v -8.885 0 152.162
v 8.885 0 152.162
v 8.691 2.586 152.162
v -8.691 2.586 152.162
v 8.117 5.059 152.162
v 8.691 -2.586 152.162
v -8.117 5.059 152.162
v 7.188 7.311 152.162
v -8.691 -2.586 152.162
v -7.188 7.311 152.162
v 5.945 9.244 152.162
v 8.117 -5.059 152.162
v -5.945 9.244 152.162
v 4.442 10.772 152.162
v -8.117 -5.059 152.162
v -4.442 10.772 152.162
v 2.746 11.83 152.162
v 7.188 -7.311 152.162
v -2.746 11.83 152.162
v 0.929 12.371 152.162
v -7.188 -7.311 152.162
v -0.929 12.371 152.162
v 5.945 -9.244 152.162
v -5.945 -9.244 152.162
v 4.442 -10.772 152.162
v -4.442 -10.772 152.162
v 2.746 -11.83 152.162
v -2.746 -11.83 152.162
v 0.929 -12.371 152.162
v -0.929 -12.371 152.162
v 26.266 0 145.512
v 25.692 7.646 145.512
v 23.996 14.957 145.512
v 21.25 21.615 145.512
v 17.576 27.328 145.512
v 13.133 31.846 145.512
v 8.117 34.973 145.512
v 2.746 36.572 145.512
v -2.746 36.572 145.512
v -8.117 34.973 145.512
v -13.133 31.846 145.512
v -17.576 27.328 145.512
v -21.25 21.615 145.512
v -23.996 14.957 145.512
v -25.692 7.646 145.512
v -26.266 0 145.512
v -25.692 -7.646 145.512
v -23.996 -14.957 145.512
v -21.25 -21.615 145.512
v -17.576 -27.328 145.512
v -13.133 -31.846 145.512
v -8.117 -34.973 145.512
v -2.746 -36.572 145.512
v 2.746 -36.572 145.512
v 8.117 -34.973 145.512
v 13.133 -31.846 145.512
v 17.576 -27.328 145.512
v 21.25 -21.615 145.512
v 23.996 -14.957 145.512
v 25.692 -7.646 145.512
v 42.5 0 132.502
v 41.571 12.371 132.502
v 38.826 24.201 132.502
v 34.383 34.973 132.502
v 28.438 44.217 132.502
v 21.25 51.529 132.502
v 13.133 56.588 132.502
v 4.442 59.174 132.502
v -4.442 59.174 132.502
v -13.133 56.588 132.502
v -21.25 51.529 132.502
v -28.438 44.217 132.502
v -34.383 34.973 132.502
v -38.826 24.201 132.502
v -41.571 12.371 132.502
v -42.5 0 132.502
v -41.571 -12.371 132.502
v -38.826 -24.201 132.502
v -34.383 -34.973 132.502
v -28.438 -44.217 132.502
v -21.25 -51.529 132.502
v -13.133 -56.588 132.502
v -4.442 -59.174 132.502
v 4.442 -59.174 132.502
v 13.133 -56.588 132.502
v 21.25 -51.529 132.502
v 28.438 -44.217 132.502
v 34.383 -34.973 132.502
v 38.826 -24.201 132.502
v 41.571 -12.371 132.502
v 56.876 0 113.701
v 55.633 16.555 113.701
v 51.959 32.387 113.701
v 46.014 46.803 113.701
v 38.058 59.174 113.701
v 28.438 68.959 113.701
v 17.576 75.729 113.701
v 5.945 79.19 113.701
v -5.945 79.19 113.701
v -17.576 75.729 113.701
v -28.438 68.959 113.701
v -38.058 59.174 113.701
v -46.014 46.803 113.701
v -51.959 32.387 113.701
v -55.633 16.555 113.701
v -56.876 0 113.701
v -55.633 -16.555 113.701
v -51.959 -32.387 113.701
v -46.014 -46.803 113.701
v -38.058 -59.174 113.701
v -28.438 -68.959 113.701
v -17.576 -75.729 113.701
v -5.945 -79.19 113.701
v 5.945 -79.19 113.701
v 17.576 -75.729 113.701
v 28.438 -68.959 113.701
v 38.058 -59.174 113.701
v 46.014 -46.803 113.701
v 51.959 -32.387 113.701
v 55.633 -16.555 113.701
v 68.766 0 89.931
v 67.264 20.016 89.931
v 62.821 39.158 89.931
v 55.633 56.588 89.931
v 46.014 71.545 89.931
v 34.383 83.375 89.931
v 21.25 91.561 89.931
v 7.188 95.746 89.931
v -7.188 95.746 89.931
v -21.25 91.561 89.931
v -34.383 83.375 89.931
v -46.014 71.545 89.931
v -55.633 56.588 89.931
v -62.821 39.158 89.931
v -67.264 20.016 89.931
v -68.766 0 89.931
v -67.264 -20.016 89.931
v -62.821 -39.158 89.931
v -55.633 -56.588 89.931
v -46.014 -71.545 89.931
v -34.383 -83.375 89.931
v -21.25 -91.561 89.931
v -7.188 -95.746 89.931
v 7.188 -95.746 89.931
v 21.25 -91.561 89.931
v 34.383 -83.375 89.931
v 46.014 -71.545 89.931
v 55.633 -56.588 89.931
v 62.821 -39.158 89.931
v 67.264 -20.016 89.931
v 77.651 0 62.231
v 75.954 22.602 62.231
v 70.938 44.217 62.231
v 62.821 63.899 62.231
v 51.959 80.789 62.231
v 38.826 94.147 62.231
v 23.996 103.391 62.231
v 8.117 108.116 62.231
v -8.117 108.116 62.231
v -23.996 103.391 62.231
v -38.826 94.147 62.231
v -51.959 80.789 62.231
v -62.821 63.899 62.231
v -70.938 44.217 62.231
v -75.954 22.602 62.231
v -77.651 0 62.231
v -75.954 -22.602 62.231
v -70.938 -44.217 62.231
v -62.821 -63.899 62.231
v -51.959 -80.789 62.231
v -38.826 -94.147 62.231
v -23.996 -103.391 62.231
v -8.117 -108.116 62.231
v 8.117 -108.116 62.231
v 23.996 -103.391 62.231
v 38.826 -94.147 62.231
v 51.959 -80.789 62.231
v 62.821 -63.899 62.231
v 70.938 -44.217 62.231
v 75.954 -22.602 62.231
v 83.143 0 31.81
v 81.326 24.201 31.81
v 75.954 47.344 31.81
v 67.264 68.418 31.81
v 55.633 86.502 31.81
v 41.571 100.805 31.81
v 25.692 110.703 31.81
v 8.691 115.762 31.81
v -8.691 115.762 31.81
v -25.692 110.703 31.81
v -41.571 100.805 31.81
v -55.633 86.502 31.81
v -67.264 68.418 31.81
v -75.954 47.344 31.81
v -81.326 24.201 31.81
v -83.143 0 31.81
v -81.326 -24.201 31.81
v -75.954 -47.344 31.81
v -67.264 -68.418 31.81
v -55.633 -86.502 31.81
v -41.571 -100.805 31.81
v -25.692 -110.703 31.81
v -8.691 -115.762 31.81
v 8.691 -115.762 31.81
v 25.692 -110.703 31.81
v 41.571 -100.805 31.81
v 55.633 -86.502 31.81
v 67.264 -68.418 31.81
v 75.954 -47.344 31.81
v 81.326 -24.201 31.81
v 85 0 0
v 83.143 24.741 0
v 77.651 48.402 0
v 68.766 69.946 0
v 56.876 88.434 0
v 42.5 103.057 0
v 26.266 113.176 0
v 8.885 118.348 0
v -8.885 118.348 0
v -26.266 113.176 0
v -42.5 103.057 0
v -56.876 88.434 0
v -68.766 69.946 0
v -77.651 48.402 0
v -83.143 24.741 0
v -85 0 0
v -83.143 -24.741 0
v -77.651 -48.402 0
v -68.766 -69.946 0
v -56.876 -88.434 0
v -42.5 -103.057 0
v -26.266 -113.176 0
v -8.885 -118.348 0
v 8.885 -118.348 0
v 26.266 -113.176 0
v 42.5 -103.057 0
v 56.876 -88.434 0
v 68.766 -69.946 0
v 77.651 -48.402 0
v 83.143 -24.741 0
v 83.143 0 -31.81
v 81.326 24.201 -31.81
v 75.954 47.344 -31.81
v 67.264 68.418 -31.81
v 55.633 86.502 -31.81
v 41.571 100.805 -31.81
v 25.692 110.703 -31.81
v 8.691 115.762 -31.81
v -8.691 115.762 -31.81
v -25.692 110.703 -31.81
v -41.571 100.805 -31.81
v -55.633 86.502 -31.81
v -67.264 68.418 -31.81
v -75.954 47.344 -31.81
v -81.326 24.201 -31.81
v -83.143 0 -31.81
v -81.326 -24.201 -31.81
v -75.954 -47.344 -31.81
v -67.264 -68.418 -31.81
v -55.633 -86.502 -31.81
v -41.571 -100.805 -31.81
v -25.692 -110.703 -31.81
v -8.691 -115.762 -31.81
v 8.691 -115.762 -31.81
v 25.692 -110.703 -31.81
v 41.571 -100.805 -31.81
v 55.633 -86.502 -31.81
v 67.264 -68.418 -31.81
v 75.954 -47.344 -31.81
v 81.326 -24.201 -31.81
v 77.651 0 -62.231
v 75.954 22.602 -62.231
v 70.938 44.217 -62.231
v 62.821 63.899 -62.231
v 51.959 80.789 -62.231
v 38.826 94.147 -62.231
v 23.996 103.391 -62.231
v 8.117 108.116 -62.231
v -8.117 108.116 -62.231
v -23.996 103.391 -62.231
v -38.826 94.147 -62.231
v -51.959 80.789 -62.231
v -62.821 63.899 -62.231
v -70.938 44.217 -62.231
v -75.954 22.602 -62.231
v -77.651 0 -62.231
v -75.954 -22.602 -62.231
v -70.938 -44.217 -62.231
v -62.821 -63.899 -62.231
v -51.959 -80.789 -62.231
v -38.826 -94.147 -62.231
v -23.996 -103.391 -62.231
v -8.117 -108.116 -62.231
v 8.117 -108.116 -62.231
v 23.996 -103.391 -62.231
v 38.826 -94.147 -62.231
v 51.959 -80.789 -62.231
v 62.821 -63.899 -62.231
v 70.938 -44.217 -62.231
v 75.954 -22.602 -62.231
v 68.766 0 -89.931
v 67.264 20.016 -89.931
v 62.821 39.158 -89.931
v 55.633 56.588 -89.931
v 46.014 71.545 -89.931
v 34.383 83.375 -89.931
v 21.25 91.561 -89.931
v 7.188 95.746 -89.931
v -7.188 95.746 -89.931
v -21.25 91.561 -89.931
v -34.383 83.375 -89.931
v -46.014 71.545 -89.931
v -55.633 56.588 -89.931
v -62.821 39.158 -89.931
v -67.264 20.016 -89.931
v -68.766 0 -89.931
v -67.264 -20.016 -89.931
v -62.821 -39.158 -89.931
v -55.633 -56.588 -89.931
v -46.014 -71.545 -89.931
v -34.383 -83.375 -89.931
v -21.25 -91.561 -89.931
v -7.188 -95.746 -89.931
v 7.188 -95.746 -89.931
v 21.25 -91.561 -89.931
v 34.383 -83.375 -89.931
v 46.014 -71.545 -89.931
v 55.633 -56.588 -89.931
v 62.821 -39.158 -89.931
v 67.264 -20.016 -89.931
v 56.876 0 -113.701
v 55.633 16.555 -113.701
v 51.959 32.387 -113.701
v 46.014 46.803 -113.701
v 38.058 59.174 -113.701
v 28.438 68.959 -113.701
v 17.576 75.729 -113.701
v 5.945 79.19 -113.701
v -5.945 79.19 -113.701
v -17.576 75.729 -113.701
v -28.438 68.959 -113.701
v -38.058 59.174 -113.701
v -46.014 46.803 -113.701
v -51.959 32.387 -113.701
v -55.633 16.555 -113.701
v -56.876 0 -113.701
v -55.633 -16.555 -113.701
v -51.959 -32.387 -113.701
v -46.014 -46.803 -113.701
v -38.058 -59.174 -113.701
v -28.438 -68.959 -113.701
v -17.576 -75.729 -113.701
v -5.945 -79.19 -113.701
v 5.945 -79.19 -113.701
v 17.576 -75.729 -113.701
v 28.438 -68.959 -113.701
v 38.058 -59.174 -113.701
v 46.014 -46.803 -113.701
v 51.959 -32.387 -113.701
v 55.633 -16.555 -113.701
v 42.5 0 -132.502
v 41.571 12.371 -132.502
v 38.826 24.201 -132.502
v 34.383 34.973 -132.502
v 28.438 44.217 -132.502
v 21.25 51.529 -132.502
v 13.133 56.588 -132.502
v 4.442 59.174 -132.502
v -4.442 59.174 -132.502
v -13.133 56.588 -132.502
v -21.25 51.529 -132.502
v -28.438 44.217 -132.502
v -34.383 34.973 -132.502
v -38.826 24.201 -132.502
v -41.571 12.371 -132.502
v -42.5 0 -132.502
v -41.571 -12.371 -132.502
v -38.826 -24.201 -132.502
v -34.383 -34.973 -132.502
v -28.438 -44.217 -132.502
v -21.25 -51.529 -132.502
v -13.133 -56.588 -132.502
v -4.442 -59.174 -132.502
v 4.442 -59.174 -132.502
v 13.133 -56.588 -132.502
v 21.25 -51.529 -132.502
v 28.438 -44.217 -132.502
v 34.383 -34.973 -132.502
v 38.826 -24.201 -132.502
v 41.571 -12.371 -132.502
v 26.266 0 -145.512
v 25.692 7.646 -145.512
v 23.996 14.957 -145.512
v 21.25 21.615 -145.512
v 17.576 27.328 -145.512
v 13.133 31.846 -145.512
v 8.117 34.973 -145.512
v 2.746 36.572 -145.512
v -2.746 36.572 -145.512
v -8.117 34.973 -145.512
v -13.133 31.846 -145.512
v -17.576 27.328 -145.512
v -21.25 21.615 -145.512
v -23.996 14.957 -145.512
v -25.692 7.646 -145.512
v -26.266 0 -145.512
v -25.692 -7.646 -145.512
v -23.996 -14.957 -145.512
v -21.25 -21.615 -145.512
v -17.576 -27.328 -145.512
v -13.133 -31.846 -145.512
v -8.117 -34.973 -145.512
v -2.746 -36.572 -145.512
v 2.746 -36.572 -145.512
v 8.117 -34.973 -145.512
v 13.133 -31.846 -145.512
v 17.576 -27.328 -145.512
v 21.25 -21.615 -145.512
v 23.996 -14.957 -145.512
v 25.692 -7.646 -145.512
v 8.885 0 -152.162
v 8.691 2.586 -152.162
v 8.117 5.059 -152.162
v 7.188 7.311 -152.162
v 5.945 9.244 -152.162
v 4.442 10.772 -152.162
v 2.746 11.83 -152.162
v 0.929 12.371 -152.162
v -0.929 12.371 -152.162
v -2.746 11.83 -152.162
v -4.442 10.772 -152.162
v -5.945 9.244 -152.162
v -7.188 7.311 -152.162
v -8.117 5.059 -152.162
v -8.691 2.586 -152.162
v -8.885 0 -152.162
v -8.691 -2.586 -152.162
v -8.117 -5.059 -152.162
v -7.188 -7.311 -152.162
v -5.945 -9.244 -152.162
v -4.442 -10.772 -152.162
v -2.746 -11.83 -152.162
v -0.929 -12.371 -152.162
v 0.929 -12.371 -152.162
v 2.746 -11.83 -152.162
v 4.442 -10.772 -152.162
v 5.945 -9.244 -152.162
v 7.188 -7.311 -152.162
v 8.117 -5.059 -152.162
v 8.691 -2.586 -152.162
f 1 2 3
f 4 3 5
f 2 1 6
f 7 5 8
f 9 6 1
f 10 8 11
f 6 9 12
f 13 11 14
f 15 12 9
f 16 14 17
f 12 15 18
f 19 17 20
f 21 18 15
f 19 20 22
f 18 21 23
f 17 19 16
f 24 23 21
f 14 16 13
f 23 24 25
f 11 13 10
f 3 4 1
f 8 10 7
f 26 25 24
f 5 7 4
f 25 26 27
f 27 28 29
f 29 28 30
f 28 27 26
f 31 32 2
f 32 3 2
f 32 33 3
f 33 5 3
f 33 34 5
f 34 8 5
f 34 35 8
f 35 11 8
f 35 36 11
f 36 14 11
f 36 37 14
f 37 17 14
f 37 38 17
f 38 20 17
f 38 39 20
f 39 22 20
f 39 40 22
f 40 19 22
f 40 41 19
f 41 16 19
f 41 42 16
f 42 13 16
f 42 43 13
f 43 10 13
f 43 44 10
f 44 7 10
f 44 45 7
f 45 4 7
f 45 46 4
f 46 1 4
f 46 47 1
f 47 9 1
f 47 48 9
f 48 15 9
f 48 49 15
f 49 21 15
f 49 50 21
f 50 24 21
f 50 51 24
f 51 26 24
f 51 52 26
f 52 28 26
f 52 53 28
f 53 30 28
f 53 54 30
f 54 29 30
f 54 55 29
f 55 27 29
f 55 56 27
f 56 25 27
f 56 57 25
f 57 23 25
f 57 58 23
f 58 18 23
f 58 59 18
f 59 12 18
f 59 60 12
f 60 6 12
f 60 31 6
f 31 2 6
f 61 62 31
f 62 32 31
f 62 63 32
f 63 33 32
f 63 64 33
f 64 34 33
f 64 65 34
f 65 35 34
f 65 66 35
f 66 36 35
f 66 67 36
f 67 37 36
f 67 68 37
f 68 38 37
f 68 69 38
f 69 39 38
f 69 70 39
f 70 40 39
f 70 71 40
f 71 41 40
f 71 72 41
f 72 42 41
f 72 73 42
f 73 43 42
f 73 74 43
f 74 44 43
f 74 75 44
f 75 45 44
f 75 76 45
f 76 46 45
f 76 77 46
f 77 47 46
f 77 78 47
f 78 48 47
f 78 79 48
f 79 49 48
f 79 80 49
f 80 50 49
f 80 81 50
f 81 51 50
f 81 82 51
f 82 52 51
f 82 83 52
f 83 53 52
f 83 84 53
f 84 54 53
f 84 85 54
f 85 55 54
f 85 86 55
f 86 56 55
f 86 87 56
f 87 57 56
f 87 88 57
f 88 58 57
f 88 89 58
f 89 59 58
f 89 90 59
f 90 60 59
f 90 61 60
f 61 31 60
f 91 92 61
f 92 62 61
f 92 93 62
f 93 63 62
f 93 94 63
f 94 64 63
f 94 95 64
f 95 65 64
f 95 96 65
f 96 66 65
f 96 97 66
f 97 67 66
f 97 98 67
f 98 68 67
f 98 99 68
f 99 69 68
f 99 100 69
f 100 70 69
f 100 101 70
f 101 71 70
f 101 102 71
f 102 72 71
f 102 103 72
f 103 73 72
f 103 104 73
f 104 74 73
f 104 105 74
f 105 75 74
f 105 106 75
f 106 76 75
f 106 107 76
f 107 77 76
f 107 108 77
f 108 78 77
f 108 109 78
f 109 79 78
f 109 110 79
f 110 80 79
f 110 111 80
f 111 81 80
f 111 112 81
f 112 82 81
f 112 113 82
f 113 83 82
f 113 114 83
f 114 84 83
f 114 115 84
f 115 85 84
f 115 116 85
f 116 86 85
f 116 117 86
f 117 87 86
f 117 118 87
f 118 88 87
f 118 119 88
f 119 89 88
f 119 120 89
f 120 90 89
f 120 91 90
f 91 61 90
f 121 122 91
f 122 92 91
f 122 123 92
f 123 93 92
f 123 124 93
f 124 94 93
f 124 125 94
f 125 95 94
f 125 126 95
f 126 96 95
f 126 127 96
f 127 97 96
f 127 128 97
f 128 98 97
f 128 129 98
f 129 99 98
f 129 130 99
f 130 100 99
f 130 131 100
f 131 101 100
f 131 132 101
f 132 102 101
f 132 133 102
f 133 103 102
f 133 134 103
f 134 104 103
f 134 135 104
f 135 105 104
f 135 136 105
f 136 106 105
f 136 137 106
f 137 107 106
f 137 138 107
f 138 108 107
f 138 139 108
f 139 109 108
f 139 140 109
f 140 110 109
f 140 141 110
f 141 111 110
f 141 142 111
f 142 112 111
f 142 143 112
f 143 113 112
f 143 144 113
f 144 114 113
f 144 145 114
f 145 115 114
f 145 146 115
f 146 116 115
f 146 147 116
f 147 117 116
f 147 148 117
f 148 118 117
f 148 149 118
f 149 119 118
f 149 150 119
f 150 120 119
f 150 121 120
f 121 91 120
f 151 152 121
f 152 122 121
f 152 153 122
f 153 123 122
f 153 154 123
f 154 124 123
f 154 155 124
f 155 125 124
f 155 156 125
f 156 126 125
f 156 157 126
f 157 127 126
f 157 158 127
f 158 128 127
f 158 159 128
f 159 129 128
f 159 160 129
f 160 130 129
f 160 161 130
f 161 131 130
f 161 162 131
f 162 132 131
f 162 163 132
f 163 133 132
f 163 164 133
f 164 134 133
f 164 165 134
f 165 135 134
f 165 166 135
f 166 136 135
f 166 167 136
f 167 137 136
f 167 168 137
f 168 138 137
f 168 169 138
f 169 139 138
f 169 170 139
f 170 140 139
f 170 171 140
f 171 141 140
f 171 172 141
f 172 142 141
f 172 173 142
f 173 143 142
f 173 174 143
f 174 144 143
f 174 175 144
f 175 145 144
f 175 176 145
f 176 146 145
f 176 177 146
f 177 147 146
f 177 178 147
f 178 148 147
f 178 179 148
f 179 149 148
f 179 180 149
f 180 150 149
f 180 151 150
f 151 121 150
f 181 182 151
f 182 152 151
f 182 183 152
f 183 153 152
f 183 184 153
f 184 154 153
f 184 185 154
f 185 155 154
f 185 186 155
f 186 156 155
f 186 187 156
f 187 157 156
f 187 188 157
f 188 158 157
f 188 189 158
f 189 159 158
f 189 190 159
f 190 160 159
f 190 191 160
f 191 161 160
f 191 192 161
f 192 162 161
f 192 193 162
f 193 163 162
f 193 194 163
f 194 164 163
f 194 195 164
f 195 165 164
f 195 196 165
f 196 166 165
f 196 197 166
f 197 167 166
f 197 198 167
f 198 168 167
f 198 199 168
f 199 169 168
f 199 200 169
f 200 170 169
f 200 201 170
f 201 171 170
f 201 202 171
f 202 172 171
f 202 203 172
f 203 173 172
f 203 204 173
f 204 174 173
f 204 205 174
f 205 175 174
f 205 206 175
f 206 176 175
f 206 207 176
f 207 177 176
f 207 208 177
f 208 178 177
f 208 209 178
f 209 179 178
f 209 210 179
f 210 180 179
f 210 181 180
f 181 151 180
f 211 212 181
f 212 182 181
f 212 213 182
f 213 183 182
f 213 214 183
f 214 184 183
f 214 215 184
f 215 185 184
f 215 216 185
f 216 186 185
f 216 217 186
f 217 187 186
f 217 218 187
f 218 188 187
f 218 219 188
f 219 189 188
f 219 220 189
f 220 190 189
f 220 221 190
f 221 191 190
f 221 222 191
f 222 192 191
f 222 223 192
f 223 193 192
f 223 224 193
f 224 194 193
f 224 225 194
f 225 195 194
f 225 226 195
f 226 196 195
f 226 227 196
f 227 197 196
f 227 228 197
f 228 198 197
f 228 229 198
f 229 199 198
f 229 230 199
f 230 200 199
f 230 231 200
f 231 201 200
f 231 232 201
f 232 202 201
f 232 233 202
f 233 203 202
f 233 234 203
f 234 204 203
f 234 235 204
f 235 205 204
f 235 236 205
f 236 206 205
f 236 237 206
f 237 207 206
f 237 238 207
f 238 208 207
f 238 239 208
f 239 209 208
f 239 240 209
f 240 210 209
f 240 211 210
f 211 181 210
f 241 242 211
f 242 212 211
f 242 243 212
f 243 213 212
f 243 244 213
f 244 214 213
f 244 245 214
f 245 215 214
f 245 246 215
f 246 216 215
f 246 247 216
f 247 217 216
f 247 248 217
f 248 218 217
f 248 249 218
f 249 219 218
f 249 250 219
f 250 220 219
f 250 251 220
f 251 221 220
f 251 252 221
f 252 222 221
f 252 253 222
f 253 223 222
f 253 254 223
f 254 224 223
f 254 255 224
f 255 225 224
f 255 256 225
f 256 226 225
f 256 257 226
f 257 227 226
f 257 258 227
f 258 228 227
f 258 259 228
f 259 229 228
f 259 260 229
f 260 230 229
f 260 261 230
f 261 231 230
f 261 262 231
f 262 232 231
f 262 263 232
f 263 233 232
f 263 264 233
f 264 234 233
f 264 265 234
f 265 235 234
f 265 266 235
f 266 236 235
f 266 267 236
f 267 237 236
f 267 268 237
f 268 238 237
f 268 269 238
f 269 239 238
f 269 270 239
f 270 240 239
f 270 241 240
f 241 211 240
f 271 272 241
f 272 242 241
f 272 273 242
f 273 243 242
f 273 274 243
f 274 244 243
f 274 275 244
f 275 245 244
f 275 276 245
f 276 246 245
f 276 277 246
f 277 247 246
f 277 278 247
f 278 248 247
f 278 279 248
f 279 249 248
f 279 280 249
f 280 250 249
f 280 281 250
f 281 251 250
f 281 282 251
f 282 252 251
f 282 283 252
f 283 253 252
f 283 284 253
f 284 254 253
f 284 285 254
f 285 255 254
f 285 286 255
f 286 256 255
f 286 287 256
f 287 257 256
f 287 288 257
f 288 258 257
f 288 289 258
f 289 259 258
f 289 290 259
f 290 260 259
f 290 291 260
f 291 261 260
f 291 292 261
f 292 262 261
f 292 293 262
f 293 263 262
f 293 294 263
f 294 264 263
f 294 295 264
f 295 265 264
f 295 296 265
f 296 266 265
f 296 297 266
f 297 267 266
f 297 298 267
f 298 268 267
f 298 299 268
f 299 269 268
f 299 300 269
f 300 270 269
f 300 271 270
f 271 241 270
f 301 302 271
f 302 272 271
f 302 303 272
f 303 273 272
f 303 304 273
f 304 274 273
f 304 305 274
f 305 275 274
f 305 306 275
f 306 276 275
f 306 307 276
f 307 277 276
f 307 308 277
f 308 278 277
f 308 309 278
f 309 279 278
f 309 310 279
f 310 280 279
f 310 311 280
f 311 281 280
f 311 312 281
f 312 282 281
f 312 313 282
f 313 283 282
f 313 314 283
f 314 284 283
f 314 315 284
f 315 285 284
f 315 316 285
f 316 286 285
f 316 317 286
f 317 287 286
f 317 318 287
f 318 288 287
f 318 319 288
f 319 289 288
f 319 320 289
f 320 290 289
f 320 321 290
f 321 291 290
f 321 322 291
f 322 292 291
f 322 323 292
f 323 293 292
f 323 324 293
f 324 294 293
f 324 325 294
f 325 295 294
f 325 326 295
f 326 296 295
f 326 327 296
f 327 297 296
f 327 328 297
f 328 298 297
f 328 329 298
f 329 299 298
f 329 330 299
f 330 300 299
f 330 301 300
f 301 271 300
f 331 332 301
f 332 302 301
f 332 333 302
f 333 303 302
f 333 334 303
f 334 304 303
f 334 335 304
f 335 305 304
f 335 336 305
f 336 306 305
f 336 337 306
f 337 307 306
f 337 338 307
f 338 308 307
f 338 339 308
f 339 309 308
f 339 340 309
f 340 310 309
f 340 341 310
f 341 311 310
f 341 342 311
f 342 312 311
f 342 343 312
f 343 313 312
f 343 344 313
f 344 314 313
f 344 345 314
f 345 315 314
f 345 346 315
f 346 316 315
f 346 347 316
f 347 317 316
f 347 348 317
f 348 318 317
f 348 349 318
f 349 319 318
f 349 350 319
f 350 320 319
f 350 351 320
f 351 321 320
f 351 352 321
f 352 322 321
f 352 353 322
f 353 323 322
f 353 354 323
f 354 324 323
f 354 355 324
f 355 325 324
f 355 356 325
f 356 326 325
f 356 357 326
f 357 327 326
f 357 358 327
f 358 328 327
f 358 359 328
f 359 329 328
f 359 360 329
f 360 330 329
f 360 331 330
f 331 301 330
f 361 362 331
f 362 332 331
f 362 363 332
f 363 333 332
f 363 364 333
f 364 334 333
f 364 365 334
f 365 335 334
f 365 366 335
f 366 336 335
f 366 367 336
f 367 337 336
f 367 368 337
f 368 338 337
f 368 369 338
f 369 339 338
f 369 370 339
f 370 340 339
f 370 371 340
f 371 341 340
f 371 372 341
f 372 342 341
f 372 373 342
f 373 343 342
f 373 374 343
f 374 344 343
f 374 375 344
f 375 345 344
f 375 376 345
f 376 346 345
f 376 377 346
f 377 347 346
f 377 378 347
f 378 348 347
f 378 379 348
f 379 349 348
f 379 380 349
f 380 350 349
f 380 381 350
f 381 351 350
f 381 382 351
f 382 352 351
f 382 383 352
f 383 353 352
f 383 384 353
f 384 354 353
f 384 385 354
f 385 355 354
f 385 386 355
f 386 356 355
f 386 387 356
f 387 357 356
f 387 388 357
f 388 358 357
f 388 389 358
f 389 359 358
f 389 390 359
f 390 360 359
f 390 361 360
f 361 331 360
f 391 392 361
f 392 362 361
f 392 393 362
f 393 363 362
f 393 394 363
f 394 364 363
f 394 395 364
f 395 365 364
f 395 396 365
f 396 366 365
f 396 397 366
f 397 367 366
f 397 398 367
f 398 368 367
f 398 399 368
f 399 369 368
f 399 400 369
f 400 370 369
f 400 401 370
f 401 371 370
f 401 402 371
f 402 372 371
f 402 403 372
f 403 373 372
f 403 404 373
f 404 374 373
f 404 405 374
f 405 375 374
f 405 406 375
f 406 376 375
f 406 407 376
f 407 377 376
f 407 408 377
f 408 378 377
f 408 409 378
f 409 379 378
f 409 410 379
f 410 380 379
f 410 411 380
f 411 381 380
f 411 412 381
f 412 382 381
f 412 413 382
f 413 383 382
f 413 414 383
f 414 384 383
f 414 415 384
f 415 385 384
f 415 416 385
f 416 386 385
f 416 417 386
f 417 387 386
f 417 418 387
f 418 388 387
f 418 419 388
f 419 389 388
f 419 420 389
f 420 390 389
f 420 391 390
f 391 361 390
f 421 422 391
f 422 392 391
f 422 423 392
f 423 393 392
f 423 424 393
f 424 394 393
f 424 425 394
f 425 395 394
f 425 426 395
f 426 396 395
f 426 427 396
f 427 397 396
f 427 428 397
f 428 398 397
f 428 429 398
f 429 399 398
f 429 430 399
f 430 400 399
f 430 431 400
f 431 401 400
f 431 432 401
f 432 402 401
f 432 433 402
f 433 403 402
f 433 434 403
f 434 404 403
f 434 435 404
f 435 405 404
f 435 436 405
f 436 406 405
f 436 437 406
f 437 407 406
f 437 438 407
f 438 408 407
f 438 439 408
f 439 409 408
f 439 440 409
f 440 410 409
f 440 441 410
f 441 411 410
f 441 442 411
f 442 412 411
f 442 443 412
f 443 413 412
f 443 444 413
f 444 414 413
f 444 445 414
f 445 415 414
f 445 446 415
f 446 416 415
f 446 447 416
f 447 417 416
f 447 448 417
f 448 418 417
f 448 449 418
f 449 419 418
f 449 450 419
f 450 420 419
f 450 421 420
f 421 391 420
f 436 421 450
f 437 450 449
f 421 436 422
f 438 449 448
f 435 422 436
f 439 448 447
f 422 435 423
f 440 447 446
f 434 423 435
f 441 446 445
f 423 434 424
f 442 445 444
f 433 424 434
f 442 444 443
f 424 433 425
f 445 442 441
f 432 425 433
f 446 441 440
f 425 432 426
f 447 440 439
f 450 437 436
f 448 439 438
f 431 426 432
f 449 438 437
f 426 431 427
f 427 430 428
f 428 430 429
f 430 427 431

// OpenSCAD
// Generated by SolidPython 1.0.1 on 2020-07-29 00:46:46


scale(v = [5, 7, 9]) {
	sphere(r = 17);
}
/***********************************************
*********      SolidPython code:      **********
************************************************
 
# import packages: SolidPython
from solid import *
from solid.utils import *
from itertools import chain, combinations, permutations


class Resize:

    def __init__(self, scad_file):
        self.scad_file = scad_file
        #self.scad_file = import_scad(scad_file)
        # cone/cylinder param:
        self.r1 = 0
        self.r2 = 0
        self.h = 0
        # rectangular prism param:
        self.w = 0
        self.l = 0
        # ellipse param:
        self.r = 0

    # import OpenScad code (file name corresponds to shape)


    # classify shape + parameters
    def assign(self, param1, param2, param3):
        if self.scad_file == 'cone.scad':
            self.r1 = param1
            self.r2 = param2
            self.h = param3
        elif self.scad_file == 'cylinder.scad':
            self.r1 = param1
            self.r2 = param2
            self.h = param3
        elif self.scad_file == 'rectangularPrism.scad':
            self.h = param1
            self.l = param2
            self.w = param3
        else:
            self.r = param1
            self.h = param2

    # resize parameters
    def iterate(self):
        x = range(3, 20, 2)
        i = 1
        if self.scad_file == 'cone.scad':
            tempList = list(permutations(x, 2))
            for temp in tempList:
                param1 = temp[0]
                param2 = temp[1]
                filepath = 'produced_scad_files/' + 'cone' + str(param1) + '_' + str(param2) + '_' + '.scad'
                scad_render_to_file(cylinder(h=param1, r1=param2, r2=0), filepath)

        elif self.scad_file == 'cylinder.scad':
            tempList = list(permutations(x, 3))
            for temp in tempList:
                param1 = temp[0]
                param2 = temp[1]
                filepath = 'produced_scad_files/' + 'cylinder' + str(param1) + '_' + str(param2) + '_' + '.scad'
                scad_render_to_file(cylinder(h=param1, r1=param2, r2=param2), filepath)

        elif self.scad_file == 'rectangularPrism.scad':
            tempList = list(permutations(x, 3))
            for temp in tempList:
                param1 = temp[0]
                param2 = temp[1]
                param3 = temp[2]
                filepath = 'produced_scad_files/' + 'rectangularPrism' + str(param1) + '_' + str(param2) + '_' + str(
                    param3) + '.scad'
                scad_render_to_file(cube(size=(param1, param2, param3)), filepath)

        elif self.scad_file == 'ellipse.scad':
            tempList = list(permutations(x, 4))
            for temp in tempList:
                param1 = temp[0]
                param2 = temp[1]
                param3 = temp[2]
                param4 = temp[3]
                filepath = 'produced_scad_files/' + 'ellipse' + str(param1) + '_' + str(param2) + '_' + str(param3) + '_' + str(param4) + '.scad'
                scad_render_to_file(scale([param1, param2, param3])(sphere(r=param4)), filepath)

    def render_to_scadfile(self):
        scad_render_to_file(scad, 'example.scad') 
 
************************************************/
